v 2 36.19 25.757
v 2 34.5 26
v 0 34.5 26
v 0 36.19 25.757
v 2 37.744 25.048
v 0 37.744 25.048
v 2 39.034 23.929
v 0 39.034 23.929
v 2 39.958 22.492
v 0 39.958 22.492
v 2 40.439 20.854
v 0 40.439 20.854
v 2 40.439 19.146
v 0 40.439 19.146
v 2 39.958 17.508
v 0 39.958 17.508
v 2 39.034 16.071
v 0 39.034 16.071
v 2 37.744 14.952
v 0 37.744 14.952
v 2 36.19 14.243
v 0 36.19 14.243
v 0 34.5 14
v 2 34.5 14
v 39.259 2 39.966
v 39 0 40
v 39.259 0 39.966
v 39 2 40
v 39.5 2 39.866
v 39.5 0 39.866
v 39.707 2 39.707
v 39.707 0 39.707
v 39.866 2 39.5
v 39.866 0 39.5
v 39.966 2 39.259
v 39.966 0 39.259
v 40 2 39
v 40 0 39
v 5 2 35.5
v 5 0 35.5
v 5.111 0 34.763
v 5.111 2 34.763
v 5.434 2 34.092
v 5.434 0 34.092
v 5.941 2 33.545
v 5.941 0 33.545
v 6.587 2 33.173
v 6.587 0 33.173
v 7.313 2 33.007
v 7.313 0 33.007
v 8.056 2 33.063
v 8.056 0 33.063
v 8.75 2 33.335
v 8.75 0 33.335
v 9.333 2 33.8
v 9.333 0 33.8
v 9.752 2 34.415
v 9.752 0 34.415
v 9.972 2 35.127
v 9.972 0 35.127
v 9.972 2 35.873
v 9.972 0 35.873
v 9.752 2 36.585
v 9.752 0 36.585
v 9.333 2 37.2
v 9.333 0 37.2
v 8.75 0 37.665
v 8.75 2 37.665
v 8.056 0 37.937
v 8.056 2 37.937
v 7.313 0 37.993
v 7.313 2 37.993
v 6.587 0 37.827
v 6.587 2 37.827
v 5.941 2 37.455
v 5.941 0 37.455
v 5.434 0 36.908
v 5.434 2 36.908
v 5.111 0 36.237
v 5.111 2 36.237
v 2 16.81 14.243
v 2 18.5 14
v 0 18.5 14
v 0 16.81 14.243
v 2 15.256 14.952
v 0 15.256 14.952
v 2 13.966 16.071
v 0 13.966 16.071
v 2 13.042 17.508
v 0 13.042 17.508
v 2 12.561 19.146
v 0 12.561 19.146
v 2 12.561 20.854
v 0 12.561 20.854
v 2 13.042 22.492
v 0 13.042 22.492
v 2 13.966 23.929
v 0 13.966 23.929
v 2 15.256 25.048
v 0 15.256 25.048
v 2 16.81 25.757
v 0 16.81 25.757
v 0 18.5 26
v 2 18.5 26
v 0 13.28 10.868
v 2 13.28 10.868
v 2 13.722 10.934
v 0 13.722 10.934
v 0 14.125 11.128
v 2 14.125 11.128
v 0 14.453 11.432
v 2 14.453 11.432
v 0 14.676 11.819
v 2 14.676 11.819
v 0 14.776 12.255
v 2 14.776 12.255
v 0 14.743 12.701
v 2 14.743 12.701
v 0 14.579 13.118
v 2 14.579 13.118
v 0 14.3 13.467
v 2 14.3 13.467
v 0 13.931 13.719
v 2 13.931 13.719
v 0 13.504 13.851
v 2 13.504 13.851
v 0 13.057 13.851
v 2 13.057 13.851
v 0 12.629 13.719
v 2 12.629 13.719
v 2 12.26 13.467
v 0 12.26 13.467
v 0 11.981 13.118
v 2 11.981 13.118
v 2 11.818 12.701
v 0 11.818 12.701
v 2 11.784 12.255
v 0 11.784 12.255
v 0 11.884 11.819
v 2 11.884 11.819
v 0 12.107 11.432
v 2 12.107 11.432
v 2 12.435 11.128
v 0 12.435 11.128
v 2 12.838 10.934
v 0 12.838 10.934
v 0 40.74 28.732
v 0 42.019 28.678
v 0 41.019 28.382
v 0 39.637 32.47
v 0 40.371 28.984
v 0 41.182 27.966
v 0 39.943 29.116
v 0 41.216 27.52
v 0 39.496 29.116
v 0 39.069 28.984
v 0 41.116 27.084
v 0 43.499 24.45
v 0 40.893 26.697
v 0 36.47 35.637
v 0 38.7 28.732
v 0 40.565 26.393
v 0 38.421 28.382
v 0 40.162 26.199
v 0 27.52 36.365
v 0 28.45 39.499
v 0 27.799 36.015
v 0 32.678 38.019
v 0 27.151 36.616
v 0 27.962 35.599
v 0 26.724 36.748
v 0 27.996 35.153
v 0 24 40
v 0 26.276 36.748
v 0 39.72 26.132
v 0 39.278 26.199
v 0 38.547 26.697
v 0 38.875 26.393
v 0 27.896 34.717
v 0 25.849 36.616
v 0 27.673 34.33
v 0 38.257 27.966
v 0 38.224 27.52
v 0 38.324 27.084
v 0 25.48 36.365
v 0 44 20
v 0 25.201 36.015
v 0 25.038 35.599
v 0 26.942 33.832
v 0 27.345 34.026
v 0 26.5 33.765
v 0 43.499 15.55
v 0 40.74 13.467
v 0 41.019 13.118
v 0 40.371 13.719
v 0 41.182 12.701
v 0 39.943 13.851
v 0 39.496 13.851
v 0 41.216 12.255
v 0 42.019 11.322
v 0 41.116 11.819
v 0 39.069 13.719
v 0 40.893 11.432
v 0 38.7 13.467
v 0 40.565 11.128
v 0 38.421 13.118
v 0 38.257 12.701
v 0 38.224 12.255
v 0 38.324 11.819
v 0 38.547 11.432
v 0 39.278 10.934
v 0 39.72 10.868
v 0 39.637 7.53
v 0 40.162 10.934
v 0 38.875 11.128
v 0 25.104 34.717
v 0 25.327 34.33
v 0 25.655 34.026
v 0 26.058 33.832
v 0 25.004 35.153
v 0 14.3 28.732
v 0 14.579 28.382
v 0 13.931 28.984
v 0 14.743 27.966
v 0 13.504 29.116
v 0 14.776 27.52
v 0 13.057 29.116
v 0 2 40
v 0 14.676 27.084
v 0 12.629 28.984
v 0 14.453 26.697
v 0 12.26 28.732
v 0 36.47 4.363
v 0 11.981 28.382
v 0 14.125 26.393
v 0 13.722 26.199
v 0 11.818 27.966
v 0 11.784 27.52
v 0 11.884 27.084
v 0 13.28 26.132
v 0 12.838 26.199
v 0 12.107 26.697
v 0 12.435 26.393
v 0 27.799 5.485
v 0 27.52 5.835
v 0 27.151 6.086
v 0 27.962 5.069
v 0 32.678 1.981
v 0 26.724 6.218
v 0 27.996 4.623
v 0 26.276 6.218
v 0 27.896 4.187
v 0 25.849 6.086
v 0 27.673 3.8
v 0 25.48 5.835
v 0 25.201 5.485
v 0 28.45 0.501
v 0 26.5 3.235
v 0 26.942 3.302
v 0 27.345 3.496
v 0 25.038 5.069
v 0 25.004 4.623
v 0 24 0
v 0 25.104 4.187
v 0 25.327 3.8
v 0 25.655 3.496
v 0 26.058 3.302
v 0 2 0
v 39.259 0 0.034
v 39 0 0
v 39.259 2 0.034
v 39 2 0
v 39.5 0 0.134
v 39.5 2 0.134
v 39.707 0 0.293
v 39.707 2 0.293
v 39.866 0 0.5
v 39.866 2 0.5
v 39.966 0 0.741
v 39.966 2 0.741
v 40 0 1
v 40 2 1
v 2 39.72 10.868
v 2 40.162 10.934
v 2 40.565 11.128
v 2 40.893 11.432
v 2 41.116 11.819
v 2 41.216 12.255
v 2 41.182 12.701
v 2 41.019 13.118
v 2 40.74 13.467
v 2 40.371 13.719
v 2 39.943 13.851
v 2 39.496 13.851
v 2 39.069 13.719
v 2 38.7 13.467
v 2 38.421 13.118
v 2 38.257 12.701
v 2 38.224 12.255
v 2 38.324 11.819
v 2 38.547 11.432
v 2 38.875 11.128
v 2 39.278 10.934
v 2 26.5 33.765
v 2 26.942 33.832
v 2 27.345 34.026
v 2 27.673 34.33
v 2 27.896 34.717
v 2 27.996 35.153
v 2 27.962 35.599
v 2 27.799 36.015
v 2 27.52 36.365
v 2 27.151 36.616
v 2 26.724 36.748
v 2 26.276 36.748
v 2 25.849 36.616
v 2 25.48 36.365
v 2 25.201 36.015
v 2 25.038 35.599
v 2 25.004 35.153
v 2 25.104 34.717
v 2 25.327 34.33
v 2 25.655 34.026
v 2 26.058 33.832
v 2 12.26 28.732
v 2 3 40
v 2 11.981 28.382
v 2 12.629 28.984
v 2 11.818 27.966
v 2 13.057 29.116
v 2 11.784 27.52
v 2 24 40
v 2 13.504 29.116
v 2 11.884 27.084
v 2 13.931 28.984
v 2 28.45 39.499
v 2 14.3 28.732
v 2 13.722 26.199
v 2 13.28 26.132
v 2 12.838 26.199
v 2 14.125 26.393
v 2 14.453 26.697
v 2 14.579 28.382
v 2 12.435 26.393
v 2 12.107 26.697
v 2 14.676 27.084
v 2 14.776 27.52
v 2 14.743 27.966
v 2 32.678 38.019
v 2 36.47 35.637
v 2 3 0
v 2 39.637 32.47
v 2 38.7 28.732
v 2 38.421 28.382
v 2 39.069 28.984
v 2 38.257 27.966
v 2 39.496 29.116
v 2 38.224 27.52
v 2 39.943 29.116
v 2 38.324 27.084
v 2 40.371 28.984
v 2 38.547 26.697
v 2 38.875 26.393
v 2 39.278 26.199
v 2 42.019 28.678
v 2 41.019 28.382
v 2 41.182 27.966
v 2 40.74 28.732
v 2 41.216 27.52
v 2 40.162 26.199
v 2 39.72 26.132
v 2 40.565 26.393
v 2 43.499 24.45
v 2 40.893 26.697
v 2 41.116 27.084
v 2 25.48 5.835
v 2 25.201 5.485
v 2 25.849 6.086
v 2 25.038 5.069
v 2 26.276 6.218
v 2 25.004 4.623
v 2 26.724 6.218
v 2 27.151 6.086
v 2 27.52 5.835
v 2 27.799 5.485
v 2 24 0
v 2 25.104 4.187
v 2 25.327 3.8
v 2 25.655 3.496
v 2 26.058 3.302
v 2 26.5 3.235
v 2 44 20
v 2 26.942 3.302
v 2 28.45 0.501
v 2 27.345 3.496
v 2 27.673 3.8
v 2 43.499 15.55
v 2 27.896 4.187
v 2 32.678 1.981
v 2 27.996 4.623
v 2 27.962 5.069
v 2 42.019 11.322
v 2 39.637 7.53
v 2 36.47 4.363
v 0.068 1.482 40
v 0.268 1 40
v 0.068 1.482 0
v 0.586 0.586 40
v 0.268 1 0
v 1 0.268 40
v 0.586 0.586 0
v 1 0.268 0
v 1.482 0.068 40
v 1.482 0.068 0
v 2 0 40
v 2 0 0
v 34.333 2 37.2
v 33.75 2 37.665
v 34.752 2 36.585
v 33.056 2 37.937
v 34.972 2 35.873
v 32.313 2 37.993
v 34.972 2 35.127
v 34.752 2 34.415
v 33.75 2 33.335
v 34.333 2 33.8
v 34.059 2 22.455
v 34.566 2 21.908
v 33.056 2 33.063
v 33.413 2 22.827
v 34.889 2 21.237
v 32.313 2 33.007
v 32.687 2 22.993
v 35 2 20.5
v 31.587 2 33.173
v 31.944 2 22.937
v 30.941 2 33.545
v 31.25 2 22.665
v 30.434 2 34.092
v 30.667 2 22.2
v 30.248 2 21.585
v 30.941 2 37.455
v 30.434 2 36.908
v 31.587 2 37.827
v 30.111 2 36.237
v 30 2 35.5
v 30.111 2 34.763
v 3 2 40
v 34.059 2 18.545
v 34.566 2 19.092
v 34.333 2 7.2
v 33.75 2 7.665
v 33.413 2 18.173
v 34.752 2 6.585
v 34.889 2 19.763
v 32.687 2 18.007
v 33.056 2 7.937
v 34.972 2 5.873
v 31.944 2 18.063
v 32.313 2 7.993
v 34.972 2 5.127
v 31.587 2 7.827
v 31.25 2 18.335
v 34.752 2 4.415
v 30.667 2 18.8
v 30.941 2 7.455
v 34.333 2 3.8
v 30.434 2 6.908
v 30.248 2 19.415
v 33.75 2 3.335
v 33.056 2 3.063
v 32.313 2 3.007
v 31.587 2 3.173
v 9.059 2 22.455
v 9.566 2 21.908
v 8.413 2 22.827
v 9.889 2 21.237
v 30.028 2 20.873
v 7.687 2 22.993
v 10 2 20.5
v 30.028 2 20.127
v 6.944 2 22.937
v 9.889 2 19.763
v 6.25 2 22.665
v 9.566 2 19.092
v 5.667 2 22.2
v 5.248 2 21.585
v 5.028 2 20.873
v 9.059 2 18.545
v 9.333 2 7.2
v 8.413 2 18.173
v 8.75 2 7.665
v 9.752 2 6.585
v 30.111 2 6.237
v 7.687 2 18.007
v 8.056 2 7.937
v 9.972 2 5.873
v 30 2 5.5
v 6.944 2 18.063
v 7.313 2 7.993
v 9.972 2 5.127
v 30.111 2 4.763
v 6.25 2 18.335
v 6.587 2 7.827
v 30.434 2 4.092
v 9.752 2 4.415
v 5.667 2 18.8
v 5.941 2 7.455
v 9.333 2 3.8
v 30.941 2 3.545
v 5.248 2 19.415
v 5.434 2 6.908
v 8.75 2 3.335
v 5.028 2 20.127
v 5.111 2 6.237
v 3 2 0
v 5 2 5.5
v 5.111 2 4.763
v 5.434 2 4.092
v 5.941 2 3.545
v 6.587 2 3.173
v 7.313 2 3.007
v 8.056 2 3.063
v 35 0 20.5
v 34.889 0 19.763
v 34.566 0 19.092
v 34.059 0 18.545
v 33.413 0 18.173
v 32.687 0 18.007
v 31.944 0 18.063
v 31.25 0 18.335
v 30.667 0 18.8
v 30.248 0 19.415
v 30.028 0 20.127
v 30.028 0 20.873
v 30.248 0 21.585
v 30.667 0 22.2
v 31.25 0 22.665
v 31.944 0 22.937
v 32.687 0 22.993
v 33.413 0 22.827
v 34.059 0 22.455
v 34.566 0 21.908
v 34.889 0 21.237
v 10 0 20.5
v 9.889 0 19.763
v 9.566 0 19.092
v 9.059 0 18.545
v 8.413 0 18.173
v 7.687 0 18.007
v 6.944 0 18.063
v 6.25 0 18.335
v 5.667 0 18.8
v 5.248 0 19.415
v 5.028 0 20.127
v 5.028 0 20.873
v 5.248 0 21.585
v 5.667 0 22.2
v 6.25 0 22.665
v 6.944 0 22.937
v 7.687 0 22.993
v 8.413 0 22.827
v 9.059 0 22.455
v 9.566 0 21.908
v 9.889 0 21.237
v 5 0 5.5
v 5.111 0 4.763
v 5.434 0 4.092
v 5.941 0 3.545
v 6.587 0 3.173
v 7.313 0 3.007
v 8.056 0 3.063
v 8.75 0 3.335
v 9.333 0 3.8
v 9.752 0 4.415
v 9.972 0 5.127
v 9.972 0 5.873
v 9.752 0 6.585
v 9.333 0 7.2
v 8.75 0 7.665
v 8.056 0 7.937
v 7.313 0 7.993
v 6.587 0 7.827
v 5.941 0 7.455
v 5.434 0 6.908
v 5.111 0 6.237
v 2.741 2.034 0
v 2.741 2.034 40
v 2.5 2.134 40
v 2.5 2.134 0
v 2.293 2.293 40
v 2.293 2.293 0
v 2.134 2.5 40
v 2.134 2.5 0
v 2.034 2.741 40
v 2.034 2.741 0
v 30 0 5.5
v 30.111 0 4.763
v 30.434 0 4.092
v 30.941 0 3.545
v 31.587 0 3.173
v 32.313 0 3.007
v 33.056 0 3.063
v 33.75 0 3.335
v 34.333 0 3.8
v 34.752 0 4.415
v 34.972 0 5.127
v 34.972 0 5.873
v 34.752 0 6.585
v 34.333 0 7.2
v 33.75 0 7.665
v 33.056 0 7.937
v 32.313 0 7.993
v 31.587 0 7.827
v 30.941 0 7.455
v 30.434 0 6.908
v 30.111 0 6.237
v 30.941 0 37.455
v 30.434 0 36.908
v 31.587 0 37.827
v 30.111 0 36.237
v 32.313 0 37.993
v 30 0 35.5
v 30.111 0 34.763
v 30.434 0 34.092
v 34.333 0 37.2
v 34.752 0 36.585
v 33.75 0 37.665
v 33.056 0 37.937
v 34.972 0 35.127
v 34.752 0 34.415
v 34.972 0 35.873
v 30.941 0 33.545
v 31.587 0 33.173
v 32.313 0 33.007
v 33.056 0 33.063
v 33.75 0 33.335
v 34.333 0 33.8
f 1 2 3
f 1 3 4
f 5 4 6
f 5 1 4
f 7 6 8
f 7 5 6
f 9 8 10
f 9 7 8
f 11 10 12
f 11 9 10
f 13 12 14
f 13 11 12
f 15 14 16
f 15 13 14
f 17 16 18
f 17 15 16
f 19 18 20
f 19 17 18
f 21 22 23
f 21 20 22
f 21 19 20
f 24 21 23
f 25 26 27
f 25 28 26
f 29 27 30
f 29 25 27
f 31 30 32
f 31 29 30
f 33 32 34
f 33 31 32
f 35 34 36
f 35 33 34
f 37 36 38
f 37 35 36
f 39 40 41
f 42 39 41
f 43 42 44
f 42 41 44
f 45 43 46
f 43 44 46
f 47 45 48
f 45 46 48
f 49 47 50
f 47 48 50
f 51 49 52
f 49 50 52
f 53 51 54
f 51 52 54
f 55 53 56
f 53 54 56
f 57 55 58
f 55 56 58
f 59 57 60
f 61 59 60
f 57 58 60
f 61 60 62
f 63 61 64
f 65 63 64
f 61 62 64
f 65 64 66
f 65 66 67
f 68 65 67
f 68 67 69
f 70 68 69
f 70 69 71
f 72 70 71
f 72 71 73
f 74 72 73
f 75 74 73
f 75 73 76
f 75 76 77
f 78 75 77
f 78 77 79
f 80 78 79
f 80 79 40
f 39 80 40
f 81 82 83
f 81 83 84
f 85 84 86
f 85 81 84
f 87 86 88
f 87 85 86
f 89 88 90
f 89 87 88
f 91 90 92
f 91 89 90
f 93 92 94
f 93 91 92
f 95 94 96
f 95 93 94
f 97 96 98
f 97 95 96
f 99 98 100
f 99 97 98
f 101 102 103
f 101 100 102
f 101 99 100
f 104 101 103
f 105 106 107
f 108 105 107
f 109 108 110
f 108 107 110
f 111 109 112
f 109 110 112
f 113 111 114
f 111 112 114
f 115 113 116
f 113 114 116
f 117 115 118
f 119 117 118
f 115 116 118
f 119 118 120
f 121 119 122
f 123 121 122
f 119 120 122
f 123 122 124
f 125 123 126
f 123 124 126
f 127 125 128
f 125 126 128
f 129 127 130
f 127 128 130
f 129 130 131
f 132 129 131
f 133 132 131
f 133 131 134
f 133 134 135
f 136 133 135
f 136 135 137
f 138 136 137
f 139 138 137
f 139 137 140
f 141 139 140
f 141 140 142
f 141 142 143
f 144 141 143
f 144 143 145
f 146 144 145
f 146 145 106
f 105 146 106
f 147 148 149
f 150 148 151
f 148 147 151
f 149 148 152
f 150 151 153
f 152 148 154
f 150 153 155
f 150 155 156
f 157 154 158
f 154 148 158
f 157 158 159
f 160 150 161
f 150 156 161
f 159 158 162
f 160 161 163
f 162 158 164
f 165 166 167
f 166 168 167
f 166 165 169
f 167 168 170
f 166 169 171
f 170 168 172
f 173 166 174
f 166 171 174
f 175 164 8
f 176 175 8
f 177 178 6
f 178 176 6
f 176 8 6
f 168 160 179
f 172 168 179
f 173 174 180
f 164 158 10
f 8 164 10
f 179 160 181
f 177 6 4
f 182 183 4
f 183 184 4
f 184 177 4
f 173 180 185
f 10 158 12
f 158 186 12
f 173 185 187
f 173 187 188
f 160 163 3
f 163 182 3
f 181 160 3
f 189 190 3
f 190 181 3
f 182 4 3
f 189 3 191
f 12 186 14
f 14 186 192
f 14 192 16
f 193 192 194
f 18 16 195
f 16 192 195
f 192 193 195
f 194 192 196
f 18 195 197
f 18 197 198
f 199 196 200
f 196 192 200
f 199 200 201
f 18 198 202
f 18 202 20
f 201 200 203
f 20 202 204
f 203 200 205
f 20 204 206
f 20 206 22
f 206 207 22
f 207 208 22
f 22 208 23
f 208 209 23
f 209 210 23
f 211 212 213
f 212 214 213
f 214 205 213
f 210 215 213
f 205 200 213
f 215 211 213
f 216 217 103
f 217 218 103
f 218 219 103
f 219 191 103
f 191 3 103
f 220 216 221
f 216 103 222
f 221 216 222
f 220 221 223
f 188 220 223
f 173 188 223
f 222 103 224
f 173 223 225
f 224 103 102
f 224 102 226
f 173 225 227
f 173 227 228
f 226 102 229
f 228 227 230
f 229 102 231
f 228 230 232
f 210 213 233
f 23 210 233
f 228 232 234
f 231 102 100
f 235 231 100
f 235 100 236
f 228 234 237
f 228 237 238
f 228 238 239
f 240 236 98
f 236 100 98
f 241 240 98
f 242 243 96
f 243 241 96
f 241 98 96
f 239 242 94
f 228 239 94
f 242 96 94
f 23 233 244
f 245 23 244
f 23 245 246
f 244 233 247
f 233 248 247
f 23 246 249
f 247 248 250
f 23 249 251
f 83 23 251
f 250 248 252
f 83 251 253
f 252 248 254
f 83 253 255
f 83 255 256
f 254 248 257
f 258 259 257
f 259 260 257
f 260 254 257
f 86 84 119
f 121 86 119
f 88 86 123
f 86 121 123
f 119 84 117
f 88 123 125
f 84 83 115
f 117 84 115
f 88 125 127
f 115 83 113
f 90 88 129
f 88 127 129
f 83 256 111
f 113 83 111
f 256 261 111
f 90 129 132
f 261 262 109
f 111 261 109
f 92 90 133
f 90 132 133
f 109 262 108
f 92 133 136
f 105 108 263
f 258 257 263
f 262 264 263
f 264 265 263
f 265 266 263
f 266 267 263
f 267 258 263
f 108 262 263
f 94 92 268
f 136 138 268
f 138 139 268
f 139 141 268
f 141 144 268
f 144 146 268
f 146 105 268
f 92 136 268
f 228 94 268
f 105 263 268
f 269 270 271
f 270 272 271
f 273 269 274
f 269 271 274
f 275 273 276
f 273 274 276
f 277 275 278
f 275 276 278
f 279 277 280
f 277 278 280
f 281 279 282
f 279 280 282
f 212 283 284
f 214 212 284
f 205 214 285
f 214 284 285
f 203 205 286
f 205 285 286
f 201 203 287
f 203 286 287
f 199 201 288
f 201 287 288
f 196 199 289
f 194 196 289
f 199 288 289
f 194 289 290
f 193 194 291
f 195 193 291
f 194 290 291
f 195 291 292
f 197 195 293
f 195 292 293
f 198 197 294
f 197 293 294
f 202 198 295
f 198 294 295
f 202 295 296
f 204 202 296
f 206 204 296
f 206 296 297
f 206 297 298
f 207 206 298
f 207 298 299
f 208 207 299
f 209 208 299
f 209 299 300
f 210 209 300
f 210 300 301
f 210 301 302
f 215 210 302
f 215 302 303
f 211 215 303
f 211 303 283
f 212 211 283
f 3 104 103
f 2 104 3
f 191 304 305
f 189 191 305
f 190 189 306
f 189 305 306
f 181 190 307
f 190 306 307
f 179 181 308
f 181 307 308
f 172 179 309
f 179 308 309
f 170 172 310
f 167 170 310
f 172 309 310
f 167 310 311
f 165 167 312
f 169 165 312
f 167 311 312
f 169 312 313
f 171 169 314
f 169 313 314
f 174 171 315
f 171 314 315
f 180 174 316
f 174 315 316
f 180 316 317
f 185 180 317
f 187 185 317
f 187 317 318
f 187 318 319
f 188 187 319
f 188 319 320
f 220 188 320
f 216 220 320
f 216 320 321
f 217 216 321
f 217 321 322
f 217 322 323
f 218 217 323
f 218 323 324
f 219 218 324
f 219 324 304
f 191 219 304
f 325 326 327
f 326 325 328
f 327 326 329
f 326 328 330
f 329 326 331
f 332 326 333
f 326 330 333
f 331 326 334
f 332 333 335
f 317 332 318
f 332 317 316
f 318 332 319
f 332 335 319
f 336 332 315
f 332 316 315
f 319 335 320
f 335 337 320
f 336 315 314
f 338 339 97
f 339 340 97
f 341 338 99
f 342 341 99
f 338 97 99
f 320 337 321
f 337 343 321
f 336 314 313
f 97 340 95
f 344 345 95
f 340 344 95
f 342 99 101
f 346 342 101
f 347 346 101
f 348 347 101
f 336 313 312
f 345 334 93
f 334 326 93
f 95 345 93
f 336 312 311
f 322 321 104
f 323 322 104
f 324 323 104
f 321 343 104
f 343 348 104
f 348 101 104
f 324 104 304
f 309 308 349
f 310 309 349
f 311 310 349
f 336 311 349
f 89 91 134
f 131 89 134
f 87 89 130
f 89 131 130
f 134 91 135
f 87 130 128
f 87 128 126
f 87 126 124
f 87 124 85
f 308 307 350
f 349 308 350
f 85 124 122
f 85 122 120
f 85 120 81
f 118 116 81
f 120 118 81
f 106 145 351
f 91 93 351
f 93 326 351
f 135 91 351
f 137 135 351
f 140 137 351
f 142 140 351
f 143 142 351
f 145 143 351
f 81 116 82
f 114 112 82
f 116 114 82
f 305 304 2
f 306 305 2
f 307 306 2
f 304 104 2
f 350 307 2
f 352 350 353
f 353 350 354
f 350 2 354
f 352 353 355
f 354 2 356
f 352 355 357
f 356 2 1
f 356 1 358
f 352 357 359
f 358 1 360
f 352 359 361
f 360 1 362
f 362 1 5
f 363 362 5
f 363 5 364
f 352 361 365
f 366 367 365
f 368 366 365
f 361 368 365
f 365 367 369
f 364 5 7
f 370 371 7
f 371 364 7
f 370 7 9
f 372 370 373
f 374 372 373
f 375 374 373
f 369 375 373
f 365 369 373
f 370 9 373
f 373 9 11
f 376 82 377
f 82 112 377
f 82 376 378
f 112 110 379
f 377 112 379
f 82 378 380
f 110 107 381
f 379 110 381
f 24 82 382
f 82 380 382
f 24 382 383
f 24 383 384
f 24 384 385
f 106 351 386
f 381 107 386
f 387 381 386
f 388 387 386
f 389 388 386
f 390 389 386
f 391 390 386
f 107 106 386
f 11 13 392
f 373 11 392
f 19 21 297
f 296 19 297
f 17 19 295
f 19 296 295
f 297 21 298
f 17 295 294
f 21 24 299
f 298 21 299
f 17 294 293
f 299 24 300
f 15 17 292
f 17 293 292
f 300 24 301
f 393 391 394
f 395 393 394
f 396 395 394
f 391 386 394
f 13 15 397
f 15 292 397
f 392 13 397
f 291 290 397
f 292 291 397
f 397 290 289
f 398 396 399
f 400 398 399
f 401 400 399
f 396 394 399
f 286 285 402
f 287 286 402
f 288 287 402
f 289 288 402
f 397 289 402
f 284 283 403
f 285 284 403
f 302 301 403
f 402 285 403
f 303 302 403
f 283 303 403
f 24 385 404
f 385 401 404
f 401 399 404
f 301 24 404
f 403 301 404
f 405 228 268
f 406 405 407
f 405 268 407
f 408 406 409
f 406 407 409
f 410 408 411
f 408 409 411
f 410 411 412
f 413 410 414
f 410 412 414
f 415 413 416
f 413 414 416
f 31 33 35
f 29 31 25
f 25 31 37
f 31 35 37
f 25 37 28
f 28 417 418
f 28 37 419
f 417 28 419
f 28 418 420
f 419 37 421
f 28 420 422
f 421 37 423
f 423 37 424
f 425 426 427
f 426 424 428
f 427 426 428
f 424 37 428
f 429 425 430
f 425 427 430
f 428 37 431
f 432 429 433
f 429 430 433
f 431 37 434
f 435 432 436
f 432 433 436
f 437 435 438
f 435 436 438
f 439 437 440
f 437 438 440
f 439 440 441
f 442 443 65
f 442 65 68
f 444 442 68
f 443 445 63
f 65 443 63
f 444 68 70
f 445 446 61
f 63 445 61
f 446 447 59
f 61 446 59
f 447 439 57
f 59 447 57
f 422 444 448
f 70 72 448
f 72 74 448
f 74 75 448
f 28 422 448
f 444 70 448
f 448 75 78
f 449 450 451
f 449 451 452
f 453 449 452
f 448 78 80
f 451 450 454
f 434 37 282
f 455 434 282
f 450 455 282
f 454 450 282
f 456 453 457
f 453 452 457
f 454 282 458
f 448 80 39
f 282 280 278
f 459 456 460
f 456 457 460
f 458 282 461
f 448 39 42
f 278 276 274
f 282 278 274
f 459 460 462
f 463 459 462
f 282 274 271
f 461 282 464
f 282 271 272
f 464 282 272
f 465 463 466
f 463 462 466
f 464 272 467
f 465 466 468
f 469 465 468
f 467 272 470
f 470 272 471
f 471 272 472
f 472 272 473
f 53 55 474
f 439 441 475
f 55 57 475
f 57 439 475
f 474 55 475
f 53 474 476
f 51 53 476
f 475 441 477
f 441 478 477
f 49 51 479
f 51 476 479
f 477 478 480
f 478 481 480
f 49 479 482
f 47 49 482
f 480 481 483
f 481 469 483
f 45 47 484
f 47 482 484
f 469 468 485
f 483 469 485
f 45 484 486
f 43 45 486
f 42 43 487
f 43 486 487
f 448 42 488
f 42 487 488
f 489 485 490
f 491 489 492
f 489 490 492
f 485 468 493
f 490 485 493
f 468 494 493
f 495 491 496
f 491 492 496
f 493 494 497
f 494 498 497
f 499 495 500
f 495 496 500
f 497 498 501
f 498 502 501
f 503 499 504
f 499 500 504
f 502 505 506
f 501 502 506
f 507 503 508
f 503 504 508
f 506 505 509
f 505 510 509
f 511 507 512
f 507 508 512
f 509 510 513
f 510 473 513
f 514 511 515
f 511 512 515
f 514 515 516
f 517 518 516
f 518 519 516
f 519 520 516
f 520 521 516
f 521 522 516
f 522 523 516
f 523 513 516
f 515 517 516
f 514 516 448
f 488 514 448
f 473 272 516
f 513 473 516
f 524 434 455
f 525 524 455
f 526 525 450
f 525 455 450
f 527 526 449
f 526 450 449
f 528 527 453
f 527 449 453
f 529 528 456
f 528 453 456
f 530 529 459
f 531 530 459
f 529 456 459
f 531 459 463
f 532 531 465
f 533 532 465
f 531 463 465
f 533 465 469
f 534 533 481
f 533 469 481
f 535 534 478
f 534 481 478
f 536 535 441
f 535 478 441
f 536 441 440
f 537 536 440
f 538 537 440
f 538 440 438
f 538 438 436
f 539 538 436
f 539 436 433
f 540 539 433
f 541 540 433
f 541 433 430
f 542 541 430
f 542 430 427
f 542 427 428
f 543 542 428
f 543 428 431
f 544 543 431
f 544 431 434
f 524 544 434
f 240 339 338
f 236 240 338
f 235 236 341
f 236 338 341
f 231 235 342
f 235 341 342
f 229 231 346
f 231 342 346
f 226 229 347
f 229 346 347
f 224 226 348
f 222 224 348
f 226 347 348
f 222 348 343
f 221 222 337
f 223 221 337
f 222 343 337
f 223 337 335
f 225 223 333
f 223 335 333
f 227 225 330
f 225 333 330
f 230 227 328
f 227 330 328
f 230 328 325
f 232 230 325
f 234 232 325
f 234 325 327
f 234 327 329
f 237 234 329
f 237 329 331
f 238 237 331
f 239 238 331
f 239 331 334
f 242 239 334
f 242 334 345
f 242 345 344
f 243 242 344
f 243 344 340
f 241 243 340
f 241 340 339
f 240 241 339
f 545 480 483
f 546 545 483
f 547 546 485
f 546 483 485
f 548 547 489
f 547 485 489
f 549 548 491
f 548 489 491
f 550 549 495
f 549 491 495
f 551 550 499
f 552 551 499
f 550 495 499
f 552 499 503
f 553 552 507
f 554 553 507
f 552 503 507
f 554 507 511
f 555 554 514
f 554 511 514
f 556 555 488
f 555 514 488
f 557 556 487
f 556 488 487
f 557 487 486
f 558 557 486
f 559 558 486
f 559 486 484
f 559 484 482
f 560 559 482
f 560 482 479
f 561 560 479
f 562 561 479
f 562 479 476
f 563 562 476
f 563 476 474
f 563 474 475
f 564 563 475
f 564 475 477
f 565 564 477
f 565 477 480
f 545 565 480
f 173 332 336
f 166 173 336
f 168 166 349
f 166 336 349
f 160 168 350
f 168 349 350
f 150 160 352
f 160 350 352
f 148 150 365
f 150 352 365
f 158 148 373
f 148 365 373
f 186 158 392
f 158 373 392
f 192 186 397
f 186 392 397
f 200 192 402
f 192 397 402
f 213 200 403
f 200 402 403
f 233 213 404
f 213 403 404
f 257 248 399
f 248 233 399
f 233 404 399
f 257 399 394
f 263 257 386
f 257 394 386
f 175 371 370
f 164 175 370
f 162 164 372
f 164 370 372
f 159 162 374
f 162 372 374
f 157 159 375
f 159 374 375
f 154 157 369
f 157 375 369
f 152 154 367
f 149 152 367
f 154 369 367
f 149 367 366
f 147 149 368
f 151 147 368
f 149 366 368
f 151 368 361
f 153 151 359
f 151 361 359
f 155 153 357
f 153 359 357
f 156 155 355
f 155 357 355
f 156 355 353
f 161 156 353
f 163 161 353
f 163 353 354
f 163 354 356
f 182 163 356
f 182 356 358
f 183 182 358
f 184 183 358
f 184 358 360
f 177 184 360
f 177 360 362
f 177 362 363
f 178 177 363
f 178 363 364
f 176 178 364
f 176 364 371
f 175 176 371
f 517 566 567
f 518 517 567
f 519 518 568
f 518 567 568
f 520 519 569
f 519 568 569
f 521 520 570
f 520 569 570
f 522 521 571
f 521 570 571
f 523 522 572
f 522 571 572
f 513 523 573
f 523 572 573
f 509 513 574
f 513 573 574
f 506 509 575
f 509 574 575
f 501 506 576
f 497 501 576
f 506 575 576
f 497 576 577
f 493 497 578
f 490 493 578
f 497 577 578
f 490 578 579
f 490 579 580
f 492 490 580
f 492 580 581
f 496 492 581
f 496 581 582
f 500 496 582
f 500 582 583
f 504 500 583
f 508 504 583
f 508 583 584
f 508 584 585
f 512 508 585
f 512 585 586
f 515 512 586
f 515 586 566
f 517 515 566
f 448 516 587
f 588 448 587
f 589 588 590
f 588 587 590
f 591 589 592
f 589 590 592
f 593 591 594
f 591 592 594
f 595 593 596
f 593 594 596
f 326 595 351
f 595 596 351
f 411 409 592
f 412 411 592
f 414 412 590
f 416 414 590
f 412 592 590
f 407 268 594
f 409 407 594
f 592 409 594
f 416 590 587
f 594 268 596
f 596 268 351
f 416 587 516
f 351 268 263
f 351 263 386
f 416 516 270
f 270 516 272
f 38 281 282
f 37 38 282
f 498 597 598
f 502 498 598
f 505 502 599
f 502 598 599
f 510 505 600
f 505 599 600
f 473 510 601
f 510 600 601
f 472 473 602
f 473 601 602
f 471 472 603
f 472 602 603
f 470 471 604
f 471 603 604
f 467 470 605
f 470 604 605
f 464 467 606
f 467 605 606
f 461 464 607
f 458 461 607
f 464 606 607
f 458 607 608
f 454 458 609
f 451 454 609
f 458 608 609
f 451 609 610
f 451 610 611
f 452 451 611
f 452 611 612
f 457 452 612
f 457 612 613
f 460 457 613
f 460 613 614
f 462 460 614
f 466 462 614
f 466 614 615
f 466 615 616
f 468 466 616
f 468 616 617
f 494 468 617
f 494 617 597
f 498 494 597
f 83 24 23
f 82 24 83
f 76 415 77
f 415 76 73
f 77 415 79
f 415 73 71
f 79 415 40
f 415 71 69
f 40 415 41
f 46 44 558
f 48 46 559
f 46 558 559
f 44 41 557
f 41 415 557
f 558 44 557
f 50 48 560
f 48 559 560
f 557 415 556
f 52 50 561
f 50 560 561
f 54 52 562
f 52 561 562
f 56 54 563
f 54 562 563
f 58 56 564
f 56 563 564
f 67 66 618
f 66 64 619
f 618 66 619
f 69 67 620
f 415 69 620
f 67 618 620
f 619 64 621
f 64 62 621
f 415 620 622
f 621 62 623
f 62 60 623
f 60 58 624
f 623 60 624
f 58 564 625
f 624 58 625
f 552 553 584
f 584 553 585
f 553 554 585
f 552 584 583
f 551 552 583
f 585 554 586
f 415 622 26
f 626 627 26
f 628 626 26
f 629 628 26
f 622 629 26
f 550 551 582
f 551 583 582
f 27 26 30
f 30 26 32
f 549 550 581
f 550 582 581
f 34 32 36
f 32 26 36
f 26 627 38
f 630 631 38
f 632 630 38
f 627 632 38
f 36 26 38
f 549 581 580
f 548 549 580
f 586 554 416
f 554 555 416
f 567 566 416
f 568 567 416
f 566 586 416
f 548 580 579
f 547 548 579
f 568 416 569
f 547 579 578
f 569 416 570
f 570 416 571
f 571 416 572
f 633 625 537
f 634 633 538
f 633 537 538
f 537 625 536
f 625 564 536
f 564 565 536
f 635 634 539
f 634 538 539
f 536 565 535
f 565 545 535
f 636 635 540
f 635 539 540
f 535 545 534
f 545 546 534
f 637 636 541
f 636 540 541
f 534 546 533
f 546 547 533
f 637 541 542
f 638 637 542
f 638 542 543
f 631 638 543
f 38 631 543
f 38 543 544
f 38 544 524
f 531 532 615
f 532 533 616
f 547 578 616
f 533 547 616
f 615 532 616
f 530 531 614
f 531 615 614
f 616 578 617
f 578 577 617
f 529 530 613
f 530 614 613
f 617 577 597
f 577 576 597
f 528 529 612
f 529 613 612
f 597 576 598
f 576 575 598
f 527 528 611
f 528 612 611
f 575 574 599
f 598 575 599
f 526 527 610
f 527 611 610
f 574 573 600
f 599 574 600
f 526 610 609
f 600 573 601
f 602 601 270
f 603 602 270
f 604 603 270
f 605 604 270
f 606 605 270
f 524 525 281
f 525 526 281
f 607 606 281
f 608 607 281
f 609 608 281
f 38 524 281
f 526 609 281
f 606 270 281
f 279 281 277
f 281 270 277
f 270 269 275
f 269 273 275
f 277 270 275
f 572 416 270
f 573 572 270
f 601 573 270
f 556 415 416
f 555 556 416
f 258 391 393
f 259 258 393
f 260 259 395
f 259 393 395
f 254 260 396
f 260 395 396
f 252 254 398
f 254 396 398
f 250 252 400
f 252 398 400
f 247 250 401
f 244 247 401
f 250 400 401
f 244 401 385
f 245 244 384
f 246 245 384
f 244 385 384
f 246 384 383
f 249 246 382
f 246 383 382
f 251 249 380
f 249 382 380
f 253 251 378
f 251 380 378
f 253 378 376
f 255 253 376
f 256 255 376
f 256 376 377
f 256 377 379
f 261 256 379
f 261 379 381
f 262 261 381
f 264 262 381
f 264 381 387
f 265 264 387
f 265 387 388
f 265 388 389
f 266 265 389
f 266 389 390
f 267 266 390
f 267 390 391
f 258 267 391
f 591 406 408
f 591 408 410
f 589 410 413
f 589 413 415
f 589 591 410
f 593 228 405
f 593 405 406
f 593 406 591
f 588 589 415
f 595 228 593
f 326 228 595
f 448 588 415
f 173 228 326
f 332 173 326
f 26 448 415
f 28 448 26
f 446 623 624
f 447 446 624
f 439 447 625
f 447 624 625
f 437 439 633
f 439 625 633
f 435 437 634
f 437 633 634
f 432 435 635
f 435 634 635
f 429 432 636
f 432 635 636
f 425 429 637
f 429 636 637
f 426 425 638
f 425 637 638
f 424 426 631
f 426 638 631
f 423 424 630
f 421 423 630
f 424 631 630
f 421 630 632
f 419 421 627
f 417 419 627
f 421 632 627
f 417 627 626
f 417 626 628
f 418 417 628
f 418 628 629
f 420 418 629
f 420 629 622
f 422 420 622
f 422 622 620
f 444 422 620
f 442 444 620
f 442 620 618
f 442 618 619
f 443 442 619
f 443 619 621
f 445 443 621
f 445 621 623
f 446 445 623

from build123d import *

# Parameters (mm, degrees)
BOSS_EXTRUDE1_DEPTH = 40
HOLE1_D             = 5
CUT_EXTRUDE1_DEPTH  = 40
CUT_EXTRUDE2_DEPTH  = 40
SKETCH7_R           = 1.5
CUT_EXTRUDE3_DEPTH  = 40
FILLET1_R           = 1
SKETCH10_R          = 2.5
CUT_EXTRUDE4_DEPTH  = 40


with BuildPart() as part:
    # Sketch2 → Boss-Extrude1 (new body)
    with BuildSketch(Plane.XY):
        with BuildLine():
            Line((2, 0), (40, 0))
            Line((40, 0), (40, 2))
            Line((40, 2), (3, 2))
            ThreePointArc((3, 2), (2.292893219, 2.292893219), (2, 3))
            Line((2, 3), (2, 45))
            Line((2, 45), (0, 45))
            Line((0, 45), (0, 2))
            ThreePointArc((0, 2), (0.585786438, 0.585786438), (2, 0))
        make_face()
    extrude(amount=BOSS_EXTRUDE1_DEPTH)

    # Hole1 (through all)
    with Locations(Plane(origin=(0, 2, 0), x_dir=(1, 0, 0), z_dir=(0, 1, 0))):
        with Locations((32.5, -35.5), (32.5, -5.5), (7.5, -5.5), (7.5, -35.5)):
            Hole(HOLE1_D / 2)

    # Sketch5 → Cut-Extrude1 (cut)
    with BuildSketch(Plane(origin=(2, 0, 0), x_dir=(0, 0, -1), z_dir=(1, 0, 0))):
        with BuildLine():
            Line((-40, 45), (-40, 24))
            ThreePointArc((-40, 24), (-20, 44), (0, 24))
            Line((0, 24), (0, 45))
            Line((0, 45), (-40, 45))
        make_face()
    extrude(amount=-CUT_EXTRUDE1_DEPTH, mode=Mode.SUBTRACT)

    # Sketch6 → Cut-Extrude2 (cut)
    with BuildSketch(Plane(origin=(2, 0, 0), x_dir=(0, 0, -1), z_dir=(1, 0, 0))):
        with BuildLine():
            Line((-14, 34.5), (-14, 18.5))
            ThreePointArc((-14, 18.5), (-20, 12.5), (-26, 18.5))
            Line((-26, 18.5), (-26, 34.5))
            ThreePointArc((-26, 34.5), (-20, 40.5), (-14, 34.5))
        make_face()
    extrude(amount=-CUT_EXTRUDE2_DEPTH, mode=Mode.SUBTRACT)

    # Sketch7 → Cut-Extrude3 (cut)
    with BuildSketch(Plane(origin=(2, 0, 0), x_dir=(0, 0, -1), z_dir=(1, 0, 0))):
        with Locations((-4.735, 26.5)):
            Circle(SKETCH7_R)
        with Locations((-35.265, 26.5)):
            Circle(SKETCH7_R)
        with Locations((-27.6325, 13.280122211)):
            Circle(SKETCH7_R)
        with Locations((-12.3675, 13.280122211)):
            Circle(SKETCH7_R)
        with Locations((-27.6325, 39.719877789)):
            Circle(SKETCH7_R)
        with Locations((-12.3675, 39.719877789)):
            Circle(SKETCH7_R)
    extrude(amount=-CUT_EXTRUDE3_DEPTH, mode=Mode.SUBTRACT)

    # Fillet1
    fillet1_edges = [part.edges().sort_by_distance(p)[0] for p in [
        (40, 1, 0),
        (40, 1, 40),
    ]]
    fillet(fillet1_edges, radius=FILLET1_R)

    # Sketch10 → Cut-Extrude4 (cut)
    with BuildSketch(Plane(origin=(0, 2, 0), x_dir=(1, 0, 0), z_dir=(0, 1, 0))):
        with Locations((7.5, -20.5)):
            Circle(SKETCH10_R)
        with Locations((32.5, -20.5)):
            Circle(SKETCH10_R)
    extrude(amount=-CUT_EXTRUDE4_DEPTH, mode=Mode.SUBTRACT)


solid = part.part
